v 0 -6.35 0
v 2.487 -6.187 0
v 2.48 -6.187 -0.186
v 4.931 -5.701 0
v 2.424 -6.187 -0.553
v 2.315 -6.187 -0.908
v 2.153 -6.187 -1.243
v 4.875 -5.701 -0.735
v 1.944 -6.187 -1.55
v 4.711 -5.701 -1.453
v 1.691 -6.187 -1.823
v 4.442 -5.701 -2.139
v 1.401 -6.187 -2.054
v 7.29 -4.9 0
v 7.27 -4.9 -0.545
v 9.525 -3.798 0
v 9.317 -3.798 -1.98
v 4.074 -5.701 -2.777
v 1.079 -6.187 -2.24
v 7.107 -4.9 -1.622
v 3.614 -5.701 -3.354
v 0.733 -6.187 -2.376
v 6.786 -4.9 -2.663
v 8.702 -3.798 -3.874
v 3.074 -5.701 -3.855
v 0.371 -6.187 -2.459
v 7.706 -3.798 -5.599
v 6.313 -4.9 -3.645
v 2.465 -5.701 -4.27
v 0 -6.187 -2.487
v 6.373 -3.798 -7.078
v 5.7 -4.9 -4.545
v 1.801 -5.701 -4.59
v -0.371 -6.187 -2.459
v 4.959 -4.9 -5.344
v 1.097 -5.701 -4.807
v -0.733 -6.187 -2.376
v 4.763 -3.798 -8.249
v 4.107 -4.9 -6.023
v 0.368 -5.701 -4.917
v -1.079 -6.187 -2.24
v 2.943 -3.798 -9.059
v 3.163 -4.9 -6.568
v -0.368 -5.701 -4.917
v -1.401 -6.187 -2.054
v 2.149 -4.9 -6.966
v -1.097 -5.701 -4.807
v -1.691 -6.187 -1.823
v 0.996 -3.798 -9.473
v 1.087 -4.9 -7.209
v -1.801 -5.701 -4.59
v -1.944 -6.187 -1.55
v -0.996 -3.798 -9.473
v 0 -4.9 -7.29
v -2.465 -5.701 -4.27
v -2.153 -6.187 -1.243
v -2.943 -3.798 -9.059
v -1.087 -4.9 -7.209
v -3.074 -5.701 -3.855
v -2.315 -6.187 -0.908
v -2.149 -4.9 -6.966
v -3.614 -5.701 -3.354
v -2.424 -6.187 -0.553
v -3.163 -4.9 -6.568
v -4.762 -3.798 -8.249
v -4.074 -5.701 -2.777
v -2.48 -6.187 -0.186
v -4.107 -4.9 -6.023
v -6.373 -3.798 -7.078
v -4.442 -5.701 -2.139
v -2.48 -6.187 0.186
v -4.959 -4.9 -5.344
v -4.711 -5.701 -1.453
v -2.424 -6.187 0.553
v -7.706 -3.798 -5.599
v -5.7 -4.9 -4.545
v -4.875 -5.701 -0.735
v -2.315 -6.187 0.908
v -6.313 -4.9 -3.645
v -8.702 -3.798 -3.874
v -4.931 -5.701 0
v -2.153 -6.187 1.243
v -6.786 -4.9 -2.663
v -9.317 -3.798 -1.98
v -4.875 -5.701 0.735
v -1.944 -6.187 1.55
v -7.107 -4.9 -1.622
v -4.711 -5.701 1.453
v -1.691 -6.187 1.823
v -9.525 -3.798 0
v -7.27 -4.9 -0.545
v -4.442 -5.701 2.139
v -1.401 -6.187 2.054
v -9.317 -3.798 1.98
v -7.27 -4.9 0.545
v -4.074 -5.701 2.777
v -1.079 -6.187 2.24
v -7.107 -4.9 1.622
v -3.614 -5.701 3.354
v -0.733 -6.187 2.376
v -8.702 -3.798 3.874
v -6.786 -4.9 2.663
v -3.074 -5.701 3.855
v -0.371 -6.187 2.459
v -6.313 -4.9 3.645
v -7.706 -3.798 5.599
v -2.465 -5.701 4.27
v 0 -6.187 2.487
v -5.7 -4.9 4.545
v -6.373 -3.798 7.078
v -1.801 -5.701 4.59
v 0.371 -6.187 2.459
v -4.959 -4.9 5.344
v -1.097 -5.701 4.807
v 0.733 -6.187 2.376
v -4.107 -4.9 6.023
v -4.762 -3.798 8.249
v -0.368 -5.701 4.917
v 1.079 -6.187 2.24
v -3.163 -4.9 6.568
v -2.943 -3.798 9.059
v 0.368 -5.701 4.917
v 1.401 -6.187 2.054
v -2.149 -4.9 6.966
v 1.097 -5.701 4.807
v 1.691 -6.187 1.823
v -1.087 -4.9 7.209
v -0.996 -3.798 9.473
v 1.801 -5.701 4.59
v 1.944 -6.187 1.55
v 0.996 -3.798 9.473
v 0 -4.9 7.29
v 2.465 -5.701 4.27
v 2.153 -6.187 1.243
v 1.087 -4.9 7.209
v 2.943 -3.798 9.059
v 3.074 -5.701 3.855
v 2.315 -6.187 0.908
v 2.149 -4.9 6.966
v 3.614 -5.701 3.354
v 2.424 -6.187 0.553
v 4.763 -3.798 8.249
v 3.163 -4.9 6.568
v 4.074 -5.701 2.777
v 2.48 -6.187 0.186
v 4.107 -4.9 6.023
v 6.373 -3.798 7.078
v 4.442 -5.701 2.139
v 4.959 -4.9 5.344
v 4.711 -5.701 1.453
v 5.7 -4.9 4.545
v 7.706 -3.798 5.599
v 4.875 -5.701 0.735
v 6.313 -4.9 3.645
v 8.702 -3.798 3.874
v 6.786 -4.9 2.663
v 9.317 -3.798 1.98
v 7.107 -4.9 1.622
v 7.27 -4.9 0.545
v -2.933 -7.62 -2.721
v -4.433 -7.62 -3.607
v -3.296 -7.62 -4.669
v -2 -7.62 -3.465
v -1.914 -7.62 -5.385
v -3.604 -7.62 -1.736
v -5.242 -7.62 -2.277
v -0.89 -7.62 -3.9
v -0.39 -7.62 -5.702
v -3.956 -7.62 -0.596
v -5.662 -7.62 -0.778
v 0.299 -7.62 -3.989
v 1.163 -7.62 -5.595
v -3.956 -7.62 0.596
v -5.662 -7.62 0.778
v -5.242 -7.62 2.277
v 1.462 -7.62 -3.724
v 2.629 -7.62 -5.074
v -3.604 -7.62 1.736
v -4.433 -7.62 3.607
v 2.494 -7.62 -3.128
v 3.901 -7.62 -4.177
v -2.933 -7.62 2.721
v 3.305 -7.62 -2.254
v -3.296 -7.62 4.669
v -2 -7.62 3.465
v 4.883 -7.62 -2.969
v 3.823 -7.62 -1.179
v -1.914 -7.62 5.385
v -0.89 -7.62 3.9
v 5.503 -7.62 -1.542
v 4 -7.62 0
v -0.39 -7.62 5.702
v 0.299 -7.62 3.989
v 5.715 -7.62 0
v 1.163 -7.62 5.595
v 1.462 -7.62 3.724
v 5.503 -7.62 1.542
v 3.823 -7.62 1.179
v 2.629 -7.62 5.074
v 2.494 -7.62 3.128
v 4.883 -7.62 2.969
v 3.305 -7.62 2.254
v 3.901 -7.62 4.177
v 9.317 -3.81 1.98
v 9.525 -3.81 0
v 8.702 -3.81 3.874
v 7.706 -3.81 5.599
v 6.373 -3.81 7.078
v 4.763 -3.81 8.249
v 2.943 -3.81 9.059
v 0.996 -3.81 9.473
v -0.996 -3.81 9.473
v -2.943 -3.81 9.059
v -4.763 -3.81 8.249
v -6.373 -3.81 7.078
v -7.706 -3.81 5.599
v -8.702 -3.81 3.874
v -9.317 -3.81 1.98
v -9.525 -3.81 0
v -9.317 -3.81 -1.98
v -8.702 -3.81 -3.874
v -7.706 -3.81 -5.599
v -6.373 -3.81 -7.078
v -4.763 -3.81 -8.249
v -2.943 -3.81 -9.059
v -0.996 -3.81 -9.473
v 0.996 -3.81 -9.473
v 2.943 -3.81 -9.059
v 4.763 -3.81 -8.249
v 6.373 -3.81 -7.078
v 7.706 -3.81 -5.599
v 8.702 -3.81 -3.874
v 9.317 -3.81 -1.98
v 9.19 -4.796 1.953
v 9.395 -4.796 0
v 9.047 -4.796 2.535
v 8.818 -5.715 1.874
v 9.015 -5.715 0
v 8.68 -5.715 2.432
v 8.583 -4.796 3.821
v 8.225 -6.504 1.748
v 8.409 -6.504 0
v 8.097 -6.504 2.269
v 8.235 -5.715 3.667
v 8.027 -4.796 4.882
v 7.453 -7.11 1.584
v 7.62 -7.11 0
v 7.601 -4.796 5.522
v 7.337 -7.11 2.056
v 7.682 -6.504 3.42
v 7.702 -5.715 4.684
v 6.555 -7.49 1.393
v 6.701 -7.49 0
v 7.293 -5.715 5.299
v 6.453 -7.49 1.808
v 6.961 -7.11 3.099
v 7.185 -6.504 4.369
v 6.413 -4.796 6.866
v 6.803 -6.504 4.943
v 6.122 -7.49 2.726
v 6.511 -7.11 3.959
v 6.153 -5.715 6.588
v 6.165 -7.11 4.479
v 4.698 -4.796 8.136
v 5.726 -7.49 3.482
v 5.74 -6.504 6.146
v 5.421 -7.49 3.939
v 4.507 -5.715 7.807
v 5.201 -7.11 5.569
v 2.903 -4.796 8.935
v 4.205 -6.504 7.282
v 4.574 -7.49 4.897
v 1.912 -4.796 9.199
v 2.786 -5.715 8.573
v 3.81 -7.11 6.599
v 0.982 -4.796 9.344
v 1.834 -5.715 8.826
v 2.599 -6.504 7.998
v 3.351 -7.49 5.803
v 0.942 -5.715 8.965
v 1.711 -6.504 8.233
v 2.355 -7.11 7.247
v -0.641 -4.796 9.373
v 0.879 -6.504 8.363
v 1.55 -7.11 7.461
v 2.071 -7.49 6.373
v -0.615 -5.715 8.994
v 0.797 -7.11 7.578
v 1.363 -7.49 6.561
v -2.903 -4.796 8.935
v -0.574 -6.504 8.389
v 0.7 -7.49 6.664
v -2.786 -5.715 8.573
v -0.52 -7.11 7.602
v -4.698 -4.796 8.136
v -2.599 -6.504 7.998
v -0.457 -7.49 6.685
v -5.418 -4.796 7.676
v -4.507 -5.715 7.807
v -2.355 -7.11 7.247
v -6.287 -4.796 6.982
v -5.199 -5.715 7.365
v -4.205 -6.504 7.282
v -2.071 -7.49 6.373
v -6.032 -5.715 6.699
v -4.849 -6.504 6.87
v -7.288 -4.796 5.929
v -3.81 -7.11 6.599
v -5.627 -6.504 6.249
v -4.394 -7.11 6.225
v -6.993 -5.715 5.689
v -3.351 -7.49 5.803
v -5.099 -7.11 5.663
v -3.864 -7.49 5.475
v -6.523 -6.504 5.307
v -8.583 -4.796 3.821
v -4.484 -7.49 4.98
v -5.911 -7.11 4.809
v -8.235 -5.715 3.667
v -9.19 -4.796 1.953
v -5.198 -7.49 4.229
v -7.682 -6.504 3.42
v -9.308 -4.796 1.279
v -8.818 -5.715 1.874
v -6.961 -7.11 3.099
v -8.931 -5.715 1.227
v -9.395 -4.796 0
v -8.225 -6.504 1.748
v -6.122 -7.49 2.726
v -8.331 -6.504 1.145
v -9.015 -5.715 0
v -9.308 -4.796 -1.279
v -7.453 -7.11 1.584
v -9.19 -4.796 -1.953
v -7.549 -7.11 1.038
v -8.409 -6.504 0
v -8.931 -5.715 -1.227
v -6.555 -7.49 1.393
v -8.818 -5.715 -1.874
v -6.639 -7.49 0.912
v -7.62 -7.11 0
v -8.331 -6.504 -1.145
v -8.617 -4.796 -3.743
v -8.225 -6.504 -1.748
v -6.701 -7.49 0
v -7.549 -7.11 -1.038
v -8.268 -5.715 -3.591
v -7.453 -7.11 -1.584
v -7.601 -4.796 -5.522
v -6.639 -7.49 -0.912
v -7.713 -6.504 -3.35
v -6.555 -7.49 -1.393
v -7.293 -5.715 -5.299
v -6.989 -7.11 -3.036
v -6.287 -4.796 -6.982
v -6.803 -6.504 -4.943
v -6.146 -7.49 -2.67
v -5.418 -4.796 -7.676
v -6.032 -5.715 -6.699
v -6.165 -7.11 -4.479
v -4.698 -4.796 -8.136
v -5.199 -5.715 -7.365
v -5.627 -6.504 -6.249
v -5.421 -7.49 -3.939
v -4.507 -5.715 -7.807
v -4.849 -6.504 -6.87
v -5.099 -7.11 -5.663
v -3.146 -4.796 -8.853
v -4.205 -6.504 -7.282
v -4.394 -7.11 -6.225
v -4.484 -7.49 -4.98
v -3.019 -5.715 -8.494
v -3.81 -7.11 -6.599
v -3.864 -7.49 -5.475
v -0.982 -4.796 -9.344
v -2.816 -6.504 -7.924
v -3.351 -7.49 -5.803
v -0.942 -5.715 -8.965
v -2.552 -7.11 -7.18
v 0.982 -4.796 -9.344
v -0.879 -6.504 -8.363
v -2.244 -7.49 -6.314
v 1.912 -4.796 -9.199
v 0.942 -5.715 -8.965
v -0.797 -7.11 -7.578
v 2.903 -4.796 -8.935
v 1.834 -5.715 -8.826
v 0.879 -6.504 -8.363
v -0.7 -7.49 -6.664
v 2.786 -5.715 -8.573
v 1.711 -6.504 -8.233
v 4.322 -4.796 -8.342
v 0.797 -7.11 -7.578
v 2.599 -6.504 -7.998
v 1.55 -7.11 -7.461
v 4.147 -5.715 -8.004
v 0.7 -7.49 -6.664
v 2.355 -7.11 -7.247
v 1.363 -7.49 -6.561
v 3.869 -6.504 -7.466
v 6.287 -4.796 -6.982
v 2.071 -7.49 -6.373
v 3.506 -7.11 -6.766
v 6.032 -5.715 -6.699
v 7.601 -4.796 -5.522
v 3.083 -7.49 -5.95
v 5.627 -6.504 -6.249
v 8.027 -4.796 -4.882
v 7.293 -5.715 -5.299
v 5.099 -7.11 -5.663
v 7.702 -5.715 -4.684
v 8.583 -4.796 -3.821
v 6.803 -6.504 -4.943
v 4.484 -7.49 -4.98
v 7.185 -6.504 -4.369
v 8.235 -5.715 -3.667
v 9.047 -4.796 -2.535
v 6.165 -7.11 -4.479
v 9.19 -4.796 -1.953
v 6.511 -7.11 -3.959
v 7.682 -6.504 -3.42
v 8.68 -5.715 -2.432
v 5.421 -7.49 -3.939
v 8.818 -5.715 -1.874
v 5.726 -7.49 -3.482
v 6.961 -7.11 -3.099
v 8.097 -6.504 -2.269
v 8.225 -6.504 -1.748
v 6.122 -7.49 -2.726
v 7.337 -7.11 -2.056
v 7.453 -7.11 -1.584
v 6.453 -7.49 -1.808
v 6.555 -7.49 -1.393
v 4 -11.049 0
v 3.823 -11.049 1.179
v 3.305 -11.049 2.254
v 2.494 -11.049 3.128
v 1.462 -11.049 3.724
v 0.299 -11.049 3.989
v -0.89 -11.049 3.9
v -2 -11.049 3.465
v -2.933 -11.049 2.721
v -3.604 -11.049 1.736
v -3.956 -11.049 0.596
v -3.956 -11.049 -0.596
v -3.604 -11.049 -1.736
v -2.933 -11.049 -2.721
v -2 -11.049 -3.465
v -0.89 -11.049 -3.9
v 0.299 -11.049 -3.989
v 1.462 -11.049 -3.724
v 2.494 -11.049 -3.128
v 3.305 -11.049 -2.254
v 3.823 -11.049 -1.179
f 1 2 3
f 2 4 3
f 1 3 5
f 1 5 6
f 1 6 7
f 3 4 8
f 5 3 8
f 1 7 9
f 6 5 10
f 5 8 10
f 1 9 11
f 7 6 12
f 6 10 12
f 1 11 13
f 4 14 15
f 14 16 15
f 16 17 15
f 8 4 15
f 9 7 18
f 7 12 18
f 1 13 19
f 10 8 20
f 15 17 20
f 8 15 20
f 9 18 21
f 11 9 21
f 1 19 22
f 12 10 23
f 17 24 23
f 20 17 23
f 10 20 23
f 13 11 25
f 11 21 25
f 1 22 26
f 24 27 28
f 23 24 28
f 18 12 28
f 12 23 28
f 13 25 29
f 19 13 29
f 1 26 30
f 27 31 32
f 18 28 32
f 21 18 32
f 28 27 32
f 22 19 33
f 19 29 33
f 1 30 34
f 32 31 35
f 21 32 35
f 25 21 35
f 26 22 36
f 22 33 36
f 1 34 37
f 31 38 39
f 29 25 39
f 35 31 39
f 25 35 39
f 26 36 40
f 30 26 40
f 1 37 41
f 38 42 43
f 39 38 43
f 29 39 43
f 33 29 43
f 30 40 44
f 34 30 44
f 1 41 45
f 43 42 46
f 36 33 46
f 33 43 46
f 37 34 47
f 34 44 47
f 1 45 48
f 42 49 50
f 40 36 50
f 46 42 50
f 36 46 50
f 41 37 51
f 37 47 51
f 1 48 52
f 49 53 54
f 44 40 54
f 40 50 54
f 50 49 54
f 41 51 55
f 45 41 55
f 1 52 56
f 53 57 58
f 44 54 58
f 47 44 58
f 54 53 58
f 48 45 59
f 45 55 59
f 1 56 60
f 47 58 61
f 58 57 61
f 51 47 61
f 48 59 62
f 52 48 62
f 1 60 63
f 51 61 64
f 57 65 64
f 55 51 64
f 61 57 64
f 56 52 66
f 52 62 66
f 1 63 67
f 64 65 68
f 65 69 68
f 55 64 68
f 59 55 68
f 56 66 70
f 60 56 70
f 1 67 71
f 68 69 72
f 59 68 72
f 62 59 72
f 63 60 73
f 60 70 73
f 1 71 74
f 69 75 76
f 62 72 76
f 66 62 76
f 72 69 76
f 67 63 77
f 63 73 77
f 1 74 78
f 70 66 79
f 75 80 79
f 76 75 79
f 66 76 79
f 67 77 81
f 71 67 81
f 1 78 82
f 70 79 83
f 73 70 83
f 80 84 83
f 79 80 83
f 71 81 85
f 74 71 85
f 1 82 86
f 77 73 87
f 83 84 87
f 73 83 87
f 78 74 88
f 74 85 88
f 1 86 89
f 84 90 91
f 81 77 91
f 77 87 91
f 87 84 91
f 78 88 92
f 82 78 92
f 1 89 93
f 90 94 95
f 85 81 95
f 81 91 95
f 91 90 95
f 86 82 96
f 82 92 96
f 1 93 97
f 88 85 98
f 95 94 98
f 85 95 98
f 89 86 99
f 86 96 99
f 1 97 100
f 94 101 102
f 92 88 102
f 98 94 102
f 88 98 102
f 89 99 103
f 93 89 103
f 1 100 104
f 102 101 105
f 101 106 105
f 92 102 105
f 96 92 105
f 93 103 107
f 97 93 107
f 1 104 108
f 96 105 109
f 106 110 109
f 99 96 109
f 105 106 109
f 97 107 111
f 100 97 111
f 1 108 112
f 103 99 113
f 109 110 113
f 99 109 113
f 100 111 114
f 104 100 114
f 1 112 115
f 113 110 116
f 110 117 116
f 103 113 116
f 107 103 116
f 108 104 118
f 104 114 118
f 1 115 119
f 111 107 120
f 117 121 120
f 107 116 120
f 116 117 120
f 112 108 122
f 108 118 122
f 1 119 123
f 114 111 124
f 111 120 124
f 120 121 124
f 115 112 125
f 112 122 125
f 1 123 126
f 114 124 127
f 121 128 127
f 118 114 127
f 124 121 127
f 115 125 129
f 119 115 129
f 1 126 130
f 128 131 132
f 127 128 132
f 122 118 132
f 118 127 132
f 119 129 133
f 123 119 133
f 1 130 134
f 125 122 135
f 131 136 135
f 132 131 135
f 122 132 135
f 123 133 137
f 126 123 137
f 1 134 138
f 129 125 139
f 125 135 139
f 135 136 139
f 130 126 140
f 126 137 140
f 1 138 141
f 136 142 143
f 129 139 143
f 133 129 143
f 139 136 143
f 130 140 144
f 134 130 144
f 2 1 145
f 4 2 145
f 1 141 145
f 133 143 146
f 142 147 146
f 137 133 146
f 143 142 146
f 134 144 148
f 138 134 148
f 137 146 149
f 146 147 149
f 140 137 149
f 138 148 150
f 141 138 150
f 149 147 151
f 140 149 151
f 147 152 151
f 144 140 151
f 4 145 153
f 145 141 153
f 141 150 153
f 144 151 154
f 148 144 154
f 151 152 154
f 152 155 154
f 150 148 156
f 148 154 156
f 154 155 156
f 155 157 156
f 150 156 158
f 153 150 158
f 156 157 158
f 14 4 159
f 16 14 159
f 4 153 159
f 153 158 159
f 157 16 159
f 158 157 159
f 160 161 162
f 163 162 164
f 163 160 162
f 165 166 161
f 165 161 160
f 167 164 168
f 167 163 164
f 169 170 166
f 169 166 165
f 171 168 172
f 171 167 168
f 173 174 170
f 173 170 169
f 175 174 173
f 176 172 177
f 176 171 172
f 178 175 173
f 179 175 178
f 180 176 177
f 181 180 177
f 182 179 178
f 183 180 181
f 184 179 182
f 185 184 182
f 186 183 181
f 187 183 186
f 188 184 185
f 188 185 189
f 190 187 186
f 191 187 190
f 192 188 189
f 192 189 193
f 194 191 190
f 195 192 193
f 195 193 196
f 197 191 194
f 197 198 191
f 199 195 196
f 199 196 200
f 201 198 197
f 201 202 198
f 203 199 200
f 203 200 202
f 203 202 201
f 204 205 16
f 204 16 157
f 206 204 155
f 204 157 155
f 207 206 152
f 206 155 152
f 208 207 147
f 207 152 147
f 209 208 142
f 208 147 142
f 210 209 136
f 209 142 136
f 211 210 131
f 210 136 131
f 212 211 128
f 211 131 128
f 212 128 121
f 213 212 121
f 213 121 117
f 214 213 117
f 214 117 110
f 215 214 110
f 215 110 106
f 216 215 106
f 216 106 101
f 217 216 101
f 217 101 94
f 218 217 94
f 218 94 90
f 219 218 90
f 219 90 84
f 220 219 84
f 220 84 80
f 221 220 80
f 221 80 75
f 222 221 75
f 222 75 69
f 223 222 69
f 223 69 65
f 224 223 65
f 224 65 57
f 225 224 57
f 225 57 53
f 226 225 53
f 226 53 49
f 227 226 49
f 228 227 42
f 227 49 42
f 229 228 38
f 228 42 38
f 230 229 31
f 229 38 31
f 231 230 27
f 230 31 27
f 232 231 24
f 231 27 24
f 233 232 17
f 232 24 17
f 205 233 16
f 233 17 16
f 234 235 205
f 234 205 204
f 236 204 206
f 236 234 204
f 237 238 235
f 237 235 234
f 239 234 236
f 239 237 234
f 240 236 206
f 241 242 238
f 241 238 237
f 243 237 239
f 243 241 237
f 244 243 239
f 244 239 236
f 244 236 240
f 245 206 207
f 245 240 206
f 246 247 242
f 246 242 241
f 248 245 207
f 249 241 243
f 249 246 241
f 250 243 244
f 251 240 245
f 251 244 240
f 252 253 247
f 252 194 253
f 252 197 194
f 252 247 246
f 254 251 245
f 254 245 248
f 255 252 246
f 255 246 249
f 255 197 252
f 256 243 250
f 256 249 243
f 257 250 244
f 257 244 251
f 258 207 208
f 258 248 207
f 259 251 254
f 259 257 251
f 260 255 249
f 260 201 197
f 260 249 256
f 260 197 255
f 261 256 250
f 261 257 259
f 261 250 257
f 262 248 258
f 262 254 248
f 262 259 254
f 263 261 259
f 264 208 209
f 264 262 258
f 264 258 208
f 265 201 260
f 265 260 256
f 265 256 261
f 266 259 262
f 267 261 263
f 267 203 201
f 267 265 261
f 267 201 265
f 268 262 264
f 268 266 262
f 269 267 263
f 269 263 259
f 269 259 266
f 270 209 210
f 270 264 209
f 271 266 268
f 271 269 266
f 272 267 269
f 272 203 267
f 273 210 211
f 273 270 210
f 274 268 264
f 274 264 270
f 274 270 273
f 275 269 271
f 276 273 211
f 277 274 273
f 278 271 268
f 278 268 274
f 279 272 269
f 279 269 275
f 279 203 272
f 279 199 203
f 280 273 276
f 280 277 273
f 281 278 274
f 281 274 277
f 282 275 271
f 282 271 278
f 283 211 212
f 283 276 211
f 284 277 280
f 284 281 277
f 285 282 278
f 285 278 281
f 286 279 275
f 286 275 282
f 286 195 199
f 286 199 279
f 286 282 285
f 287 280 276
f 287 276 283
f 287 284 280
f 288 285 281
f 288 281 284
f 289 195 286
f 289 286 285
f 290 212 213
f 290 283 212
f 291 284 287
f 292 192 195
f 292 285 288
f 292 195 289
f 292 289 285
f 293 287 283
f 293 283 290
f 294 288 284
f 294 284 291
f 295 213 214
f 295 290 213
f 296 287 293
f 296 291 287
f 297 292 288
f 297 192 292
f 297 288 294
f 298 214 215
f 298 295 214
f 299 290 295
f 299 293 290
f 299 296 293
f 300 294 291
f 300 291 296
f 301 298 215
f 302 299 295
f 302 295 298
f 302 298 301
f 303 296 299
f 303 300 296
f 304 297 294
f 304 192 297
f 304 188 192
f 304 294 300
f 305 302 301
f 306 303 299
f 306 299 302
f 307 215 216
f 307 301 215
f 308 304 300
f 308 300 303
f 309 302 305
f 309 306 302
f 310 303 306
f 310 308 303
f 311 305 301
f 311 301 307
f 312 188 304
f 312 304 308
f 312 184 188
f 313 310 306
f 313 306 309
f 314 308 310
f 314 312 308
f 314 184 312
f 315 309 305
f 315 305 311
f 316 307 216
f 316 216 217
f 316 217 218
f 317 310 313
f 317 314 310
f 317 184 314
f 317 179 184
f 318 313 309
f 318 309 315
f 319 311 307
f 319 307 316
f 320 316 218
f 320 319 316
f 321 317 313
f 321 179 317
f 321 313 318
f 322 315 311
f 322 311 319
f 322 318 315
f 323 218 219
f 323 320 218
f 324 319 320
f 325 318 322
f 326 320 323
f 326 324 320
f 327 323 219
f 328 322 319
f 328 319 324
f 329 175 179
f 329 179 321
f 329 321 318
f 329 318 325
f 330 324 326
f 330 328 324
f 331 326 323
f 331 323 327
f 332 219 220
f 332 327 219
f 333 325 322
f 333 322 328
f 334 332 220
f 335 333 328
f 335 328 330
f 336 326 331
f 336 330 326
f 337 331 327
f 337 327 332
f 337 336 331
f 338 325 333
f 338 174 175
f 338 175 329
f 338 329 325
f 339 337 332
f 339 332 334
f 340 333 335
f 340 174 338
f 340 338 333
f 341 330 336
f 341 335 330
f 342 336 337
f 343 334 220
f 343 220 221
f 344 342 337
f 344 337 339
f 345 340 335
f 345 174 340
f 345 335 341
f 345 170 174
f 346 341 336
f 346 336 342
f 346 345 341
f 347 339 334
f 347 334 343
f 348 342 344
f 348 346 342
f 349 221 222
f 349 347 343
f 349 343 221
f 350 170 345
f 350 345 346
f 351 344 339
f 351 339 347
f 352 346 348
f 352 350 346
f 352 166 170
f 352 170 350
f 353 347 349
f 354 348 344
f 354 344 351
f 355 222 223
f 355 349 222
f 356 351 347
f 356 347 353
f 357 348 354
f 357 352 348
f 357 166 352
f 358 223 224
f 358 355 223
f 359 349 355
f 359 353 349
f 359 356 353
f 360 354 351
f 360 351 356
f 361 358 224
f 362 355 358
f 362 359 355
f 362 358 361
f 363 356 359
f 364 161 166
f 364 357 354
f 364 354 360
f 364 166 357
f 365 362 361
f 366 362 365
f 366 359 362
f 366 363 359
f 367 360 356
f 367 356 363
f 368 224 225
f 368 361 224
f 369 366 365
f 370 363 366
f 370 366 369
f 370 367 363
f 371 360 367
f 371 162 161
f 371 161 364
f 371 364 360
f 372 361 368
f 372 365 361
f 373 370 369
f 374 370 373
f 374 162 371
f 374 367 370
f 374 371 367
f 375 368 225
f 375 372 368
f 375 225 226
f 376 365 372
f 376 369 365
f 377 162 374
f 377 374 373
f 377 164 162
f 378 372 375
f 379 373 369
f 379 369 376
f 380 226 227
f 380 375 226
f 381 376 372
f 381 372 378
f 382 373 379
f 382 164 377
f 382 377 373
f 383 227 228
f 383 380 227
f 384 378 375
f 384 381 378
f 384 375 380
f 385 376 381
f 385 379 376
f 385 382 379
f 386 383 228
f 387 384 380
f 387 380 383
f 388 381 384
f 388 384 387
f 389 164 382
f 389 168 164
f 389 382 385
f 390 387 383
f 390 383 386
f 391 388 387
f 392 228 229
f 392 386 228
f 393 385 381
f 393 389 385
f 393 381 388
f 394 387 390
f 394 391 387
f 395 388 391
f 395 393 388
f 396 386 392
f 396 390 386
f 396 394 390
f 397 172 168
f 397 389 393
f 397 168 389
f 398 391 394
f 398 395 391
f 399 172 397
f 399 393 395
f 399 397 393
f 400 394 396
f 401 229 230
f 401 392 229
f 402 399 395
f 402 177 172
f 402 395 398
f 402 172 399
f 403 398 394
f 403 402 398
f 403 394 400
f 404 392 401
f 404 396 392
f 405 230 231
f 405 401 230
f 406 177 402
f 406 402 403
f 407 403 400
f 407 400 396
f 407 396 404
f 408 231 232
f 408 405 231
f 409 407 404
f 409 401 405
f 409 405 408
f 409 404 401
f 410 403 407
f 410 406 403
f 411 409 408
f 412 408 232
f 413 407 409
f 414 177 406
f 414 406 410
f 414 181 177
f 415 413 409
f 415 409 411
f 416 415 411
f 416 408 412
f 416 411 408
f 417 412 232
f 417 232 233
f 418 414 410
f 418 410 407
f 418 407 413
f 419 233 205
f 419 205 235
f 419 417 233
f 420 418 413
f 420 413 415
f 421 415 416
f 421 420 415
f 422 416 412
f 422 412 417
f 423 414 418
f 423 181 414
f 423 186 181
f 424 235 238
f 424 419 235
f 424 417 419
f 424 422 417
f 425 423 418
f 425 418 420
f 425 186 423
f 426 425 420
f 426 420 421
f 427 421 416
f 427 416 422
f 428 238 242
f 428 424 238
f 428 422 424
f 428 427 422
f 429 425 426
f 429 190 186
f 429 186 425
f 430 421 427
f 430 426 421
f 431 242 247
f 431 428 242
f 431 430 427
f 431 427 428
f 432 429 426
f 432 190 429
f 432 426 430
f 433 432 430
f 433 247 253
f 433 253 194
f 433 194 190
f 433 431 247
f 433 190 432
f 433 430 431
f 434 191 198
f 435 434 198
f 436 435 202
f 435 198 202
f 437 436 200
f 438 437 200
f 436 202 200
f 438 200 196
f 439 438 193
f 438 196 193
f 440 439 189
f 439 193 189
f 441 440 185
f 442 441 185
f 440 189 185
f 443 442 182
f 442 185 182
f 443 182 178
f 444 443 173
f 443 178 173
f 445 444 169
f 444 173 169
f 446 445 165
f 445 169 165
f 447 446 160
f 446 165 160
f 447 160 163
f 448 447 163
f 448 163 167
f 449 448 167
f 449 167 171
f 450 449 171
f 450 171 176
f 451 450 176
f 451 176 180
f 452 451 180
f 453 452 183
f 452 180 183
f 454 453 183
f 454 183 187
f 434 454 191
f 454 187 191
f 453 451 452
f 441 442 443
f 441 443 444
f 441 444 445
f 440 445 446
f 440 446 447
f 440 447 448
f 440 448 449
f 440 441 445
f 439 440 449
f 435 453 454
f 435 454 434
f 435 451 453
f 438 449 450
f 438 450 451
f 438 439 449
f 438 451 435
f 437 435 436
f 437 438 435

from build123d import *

# Parameters (mm, degrees)
F1_R     = 9.525
F2_DEPTH = 7.62
F4_R     = 4.0005
F5_DEPTH = 3.429
F6_R     = 3.81


with BuildPart() as f2:
    # F1 (on Front) → F2 (new body)
    with BuildSketch(Plane.XZ):
        Circle(F1_R)
    extrude(amount=F2_DEPTH)

    # F0 (on Top) → F3 (revolve, cut)
    with BuildSketch(Plane.XY):
        with BuildLine():
            Line((0, 31.75), (0, -6.35))
            ThreePointArc((0, -6.35), (19.05, 12.7), (0, 31.75))
        make_face()
    revolve(axis=Axis((0, 12.7, 0), (0, 1, 0)), mode=Mode.SUBTRACT)

    # F4 (on face) → F5 (join)
    with BuildSketch(Plane.XZ.offset(7.62)):
        Circle(F4_R)
    extrude(amount=F5_DEPTH)

    # F6
    f6_edges = [f2.edges().sort_by_distance(p)[0] for p in [
        (-9.525, -7.62, 0),
    ]]
    fillet(f6_edges, radius=F6_R)


solid = f2.part
